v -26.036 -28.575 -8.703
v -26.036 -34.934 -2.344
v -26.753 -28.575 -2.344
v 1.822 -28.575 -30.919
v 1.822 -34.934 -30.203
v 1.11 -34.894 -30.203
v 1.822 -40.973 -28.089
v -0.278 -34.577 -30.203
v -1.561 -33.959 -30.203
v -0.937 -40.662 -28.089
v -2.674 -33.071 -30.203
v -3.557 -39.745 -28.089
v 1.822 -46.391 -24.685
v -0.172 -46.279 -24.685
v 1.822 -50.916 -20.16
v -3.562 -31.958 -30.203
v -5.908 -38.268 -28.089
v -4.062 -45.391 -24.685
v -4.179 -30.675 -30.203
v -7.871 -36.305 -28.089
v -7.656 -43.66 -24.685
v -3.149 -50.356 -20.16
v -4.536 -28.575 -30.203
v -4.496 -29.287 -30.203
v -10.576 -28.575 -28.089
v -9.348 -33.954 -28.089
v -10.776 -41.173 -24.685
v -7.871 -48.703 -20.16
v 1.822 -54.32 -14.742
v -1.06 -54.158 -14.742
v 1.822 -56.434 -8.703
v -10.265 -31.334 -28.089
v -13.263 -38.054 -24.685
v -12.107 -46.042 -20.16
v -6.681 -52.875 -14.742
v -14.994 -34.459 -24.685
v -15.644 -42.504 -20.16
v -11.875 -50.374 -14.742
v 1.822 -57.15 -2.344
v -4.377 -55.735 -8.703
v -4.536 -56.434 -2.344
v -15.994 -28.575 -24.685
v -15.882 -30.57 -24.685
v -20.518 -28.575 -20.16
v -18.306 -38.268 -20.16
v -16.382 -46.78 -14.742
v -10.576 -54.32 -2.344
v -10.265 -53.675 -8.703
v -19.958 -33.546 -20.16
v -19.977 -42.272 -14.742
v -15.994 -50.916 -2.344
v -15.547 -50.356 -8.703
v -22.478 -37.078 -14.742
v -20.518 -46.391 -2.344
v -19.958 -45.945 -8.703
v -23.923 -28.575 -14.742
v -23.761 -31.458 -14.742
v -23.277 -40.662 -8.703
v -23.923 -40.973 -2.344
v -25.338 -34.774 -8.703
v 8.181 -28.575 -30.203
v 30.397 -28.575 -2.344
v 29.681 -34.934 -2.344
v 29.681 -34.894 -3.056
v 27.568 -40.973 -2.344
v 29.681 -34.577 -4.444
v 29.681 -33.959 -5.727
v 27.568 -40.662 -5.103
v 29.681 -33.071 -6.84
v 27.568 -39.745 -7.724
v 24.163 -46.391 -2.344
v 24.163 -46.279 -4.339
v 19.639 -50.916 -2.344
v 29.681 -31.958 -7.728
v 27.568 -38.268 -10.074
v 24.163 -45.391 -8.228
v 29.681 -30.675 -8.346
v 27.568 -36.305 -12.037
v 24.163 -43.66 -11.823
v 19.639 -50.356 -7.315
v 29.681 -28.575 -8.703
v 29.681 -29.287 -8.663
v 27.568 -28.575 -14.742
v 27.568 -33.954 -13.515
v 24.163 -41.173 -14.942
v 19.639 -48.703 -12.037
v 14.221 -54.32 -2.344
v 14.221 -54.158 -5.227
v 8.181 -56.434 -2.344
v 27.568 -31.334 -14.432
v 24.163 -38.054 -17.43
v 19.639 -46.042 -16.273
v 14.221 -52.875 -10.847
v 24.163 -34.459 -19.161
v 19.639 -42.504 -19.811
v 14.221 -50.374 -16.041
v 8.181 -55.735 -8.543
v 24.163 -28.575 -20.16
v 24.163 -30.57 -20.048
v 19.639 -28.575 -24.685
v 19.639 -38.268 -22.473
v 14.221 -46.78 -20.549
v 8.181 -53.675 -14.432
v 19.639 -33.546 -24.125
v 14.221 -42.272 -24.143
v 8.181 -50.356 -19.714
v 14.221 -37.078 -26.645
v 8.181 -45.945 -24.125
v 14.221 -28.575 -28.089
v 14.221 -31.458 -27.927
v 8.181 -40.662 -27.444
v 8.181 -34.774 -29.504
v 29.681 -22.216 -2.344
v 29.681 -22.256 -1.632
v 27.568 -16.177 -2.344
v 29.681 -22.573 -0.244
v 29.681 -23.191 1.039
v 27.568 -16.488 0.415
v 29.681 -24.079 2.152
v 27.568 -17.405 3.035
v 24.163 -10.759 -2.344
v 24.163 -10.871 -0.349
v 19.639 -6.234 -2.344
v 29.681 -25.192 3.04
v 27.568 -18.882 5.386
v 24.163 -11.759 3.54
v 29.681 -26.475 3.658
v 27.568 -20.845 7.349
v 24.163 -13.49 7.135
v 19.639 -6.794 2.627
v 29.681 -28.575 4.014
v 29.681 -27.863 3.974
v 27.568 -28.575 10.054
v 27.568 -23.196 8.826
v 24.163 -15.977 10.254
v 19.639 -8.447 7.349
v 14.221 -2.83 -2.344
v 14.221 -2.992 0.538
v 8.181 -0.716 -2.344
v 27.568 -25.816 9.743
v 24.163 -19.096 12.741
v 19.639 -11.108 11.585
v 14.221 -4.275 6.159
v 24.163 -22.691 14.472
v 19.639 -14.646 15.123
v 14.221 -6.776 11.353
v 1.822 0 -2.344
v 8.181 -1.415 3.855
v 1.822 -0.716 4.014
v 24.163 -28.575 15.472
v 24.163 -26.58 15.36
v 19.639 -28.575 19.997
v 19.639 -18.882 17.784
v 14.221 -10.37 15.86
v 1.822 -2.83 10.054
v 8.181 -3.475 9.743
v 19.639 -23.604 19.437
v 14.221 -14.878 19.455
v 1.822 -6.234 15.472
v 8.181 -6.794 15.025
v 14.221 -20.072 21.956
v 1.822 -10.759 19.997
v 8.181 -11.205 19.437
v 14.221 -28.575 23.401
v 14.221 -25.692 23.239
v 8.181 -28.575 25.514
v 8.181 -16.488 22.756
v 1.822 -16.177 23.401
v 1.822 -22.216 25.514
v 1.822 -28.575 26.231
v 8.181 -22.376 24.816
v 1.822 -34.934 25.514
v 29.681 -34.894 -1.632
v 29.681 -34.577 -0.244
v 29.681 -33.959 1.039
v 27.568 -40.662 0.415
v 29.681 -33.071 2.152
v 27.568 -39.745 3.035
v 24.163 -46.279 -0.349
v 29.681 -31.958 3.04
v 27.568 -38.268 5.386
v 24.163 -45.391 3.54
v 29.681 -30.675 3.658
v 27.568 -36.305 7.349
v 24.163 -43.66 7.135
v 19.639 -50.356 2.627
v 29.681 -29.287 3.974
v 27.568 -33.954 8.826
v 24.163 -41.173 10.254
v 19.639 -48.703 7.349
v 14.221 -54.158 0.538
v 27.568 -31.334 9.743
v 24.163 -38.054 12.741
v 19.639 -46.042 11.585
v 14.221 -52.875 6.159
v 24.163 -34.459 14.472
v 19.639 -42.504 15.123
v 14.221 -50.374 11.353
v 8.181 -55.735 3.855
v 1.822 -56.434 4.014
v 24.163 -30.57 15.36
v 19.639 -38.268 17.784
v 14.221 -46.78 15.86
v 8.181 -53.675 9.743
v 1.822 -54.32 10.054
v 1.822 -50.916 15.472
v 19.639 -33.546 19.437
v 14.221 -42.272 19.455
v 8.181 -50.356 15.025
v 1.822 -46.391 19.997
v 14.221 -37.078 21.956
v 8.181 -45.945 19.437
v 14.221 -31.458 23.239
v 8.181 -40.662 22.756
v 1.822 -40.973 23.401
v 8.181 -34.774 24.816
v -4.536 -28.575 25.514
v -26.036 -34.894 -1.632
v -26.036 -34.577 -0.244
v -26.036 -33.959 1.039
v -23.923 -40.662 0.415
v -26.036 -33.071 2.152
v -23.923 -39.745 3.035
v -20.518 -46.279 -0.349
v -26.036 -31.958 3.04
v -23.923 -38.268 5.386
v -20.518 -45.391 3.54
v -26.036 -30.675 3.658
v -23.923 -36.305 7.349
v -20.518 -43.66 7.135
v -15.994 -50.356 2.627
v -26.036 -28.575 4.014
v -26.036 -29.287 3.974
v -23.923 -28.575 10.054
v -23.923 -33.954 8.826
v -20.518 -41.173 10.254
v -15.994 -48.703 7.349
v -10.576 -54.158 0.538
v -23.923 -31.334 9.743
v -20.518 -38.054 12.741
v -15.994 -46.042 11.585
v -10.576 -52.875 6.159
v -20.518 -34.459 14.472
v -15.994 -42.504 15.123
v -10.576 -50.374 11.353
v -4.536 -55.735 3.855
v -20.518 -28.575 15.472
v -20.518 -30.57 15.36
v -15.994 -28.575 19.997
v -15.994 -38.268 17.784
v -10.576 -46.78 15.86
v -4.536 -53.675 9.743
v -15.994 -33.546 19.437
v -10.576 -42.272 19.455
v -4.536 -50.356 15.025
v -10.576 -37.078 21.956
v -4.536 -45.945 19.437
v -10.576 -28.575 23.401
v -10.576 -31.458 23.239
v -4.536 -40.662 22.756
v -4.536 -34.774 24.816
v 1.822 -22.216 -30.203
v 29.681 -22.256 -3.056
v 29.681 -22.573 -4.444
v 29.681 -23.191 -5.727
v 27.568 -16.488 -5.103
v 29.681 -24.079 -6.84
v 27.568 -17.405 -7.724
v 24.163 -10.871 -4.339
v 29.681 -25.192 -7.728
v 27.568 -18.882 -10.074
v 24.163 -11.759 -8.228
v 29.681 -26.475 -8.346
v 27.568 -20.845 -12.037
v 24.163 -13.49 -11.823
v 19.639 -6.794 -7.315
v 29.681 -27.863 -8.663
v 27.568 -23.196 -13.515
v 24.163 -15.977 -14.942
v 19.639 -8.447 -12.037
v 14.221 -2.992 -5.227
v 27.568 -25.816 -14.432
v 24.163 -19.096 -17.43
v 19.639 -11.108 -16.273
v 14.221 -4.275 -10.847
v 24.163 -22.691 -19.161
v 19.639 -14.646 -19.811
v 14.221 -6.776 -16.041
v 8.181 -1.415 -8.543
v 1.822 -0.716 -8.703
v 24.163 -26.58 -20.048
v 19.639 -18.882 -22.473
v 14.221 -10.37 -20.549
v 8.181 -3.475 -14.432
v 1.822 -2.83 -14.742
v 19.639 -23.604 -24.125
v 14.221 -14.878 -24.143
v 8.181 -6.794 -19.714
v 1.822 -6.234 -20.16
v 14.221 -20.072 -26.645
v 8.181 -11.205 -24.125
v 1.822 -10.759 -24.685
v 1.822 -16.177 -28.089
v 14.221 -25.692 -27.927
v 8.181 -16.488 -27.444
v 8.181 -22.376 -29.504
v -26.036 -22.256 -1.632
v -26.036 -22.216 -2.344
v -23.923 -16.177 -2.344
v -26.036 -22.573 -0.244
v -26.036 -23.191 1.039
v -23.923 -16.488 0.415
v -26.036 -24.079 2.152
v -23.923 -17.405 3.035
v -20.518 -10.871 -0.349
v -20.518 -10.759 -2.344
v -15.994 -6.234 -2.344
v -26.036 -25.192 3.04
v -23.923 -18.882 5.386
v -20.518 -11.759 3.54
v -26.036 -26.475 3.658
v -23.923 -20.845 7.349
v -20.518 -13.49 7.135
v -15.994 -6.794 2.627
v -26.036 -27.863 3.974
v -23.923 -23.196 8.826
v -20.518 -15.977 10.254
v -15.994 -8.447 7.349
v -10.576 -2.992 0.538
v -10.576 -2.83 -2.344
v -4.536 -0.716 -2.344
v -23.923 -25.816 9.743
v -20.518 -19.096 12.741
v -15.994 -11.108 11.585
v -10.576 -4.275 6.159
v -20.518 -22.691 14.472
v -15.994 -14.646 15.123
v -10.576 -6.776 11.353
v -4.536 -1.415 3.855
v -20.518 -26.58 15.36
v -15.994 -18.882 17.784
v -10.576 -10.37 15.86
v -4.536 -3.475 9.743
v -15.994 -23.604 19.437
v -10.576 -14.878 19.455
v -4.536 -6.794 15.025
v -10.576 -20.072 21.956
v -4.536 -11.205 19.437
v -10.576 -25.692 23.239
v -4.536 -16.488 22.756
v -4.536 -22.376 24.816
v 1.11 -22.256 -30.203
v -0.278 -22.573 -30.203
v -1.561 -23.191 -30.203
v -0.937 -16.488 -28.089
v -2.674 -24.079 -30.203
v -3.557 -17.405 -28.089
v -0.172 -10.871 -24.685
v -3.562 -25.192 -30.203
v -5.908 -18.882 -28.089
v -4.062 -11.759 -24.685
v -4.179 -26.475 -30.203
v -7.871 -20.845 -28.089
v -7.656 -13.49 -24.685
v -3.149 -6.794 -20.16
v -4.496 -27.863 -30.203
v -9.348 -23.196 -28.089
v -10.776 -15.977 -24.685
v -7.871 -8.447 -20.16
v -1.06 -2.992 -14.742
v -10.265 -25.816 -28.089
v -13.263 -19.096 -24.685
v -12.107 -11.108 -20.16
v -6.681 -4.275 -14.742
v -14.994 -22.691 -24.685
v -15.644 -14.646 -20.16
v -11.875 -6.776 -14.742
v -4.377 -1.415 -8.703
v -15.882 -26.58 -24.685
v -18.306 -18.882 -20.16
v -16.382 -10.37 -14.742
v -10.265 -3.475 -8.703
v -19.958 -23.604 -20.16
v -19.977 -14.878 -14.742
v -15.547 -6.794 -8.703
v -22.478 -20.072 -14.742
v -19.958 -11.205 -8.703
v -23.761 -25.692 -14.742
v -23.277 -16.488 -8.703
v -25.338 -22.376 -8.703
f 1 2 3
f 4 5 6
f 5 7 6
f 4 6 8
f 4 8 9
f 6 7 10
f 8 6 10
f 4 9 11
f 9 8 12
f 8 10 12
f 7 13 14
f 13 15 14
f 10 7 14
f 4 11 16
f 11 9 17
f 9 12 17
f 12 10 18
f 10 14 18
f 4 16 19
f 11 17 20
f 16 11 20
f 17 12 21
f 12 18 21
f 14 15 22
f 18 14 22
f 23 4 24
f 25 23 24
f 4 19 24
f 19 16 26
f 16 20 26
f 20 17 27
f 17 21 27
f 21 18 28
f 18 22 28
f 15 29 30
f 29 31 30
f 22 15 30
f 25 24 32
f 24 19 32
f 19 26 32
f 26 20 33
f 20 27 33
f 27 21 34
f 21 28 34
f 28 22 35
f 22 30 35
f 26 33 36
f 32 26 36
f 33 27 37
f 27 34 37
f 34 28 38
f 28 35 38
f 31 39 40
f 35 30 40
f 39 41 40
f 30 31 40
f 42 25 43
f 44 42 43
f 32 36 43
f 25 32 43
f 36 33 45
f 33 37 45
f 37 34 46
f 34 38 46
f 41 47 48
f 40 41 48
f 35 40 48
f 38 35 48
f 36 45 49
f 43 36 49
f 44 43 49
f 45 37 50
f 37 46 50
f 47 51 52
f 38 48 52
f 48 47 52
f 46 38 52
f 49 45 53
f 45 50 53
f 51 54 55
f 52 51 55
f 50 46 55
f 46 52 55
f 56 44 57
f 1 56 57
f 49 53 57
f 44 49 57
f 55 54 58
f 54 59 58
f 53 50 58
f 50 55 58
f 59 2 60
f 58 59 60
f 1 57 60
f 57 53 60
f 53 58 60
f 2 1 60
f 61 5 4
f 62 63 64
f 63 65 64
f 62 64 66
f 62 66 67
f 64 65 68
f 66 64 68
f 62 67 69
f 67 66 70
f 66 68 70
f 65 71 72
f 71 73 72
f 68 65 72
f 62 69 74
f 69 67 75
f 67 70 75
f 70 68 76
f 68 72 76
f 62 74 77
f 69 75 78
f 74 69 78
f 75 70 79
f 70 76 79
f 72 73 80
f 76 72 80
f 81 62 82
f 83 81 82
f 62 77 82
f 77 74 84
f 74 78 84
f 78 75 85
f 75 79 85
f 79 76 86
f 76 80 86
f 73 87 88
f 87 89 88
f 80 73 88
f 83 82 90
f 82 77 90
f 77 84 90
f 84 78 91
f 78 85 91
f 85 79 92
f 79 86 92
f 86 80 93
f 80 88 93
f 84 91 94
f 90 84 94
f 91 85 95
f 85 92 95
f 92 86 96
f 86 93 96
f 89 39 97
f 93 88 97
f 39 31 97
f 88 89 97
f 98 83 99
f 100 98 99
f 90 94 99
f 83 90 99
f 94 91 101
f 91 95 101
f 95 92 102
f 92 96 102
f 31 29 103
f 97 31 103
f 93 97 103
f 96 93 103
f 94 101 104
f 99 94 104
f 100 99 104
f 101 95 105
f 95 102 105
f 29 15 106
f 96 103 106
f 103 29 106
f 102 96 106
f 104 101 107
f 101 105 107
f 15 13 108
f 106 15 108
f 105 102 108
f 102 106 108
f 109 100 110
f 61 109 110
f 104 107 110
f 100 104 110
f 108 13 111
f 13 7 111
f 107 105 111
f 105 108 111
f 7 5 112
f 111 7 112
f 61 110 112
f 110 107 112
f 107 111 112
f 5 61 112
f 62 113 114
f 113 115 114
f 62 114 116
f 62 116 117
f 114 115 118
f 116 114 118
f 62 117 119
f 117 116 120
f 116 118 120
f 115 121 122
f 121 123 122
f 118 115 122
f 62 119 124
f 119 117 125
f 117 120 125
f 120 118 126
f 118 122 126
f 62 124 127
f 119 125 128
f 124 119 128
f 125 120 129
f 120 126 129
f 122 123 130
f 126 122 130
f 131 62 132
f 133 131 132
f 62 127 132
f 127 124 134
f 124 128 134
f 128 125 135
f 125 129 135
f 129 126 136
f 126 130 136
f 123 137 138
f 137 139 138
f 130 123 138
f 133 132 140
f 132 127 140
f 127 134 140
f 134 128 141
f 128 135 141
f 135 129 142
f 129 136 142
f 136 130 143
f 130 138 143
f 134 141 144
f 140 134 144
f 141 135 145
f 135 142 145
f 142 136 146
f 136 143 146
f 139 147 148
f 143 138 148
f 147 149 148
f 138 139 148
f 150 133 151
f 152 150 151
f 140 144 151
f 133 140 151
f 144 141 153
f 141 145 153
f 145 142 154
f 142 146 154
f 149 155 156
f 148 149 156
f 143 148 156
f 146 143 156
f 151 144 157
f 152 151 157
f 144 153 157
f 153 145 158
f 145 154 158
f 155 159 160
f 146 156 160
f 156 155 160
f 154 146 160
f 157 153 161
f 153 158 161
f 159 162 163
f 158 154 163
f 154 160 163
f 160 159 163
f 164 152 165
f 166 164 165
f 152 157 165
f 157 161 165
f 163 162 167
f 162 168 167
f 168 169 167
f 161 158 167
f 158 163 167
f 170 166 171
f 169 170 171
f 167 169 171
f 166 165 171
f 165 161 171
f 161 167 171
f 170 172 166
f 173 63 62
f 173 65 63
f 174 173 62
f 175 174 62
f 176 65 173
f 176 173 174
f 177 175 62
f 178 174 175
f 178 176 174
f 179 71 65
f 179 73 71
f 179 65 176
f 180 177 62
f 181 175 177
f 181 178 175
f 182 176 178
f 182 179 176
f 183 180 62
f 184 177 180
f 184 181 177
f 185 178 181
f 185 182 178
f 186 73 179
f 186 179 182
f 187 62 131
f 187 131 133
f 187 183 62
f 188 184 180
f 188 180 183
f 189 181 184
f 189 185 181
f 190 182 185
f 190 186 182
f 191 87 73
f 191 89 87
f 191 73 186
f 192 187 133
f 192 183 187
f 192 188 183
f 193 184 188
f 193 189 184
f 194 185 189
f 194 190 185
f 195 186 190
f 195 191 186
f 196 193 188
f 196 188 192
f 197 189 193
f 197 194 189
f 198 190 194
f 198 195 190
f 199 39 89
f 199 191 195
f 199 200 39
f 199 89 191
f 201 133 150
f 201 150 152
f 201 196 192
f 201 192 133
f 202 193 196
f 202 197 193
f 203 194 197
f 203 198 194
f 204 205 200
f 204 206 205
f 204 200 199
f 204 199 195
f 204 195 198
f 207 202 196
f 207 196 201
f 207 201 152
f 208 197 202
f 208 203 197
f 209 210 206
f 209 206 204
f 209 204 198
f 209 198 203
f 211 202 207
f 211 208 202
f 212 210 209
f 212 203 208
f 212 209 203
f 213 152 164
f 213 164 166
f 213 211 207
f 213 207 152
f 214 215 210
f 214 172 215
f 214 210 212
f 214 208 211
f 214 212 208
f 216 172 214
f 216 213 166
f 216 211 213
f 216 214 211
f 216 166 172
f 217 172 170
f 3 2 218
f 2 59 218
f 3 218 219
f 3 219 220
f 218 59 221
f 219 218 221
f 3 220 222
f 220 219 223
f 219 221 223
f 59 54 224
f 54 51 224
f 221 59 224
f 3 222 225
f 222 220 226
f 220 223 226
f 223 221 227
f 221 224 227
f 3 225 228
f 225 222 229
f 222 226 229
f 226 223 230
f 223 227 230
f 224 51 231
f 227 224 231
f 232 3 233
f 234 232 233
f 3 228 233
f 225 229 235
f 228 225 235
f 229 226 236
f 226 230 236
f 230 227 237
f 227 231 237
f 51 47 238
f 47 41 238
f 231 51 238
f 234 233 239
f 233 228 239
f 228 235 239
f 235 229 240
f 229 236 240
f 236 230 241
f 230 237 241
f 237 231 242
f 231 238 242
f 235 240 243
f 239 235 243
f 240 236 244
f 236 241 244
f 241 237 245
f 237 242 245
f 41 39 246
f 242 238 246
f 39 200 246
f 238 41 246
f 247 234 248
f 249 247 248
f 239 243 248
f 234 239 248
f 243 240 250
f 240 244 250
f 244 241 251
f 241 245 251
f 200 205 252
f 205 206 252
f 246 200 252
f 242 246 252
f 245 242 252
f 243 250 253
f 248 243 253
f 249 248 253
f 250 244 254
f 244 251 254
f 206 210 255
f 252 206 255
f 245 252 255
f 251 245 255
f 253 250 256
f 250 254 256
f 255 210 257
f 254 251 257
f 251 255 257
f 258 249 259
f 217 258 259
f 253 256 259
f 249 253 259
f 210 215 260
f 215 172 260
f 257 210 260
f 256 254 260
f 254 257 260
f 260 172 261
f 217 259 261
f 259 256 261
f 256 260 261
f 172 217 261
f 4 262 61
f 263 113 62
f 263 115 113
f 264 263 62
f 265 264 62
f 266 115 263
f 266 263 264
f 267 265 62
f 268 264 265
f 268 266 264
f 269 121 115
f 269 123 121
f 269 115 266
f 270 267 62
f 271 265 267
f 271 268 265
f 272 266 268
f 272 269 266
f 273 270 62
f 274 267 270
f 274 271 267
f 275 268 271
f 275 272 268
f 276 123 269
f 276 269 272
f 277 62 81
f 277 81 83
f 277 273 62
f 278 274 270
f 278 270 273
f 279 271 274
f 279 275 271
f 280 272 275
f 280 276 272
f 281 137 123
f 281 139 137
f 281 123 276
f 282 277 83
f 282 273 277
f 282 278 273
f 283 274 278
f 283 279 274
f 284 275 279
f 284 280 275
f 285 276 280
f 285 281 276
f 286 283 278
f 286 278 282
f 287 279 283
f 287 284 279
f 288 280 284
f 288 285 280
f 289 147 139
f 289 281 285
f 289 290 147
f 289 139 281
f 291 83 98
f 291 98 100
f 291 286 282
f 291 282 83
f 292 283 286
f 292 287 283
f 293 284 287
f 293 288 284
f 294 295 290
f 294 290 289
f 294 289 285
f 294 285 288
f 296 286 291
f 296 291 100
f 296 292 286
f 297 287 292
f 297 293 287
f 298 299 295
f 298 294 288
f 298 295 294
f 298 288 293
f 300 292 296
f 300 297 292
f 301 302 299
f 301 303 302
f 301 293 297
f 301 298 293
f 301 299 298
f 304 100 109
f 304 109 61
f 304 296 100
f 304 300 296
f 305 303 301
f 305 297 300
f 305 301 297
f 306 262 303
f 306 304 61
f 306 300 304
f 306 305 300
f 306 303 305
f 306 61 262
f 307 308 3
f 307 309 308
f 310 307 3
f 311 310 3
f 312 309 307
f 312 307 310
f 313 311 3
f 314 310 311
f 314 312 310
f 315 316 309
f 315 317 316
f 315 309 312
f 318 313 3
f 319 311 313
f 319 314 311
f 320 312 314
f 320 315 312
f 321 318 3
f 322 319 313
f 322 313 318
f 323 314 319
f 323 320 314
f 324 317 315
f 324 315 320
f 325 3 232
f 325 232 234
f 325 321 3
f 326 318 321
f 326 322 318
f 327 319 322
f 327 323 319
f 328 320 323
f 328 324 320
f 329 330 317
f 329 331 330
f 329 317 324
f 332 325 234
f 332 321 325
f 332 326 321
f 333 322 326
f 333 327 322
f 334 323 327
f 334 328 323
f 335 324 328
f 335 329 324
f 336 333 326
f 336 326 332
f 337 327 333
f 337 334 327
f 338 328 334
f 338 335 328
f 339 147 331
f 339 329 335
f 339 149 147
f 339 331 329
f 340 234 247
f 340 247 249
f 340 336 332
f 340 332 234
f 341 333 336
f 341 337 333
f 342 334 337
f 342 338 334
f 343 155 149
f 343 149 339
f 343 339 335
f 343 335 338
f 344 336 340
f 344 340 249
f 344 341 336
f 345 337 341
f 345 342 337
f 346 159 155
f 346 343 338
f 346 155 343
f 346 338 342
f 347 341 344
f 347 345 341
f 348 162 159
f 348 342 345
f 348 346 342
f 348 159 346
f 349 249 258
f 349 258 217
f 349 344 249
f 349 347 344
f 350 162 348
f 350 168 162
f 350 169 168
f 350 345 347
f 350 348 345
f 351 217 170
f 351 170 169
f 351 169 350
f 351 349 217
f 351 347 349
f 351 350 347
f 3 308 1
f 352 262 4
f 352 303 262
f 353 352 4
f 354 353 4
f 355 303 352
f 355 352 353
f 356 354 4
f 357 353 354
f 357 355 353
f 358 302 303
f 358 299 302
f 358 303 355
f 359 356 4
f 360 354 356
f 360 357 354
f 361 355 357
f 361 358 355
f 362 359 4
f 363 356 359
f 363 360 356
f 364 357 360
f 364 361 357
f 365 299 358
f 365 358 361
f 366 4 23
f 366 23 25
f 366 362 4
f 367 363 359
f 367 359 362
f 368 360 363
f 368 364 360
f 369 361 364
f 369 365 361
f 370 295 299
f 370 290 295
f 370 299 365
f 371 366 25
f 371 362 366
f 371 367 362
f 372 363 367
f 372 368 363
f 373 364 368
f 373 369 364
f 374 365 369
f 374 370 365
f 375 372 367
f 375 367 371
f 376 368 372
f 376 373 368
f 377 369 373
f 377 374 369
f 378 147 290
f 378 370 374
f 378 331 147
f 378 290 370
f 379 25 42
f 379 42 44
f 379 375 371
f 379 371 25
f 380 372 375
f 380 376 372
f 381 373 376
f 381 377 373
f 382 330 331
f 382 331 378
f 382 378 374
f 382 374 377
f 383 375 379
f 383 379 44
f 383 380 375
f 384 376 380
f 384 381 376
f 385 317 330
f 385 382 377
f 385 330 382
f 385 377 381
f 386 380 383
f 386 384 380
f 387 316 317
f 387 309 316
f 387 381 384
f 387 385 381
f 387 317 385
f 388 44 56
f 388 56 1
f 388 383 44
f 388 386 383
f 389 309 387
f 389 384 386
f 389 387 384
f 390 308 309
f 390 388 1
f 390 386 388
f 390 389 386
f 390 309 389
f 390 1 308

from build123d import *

# Parameters (mm, degrees)
F1_W     = 57.15
F1_H     = 57.15
F2_DEPTH = 57.15
F3_R     = 28.57499


# Not quite as in the source:
# - a fillet or chamfer is up to 0.001 mm smaller than in the source, because OpenCascade refuses the exact size


with BuildPart() as f2:
    # F1 (on Front) → F2 (new body)
    with BuildSketch(Plane.XZ):
        with Locations((1.8223590608, -2.3441536301)):
            Rectangle(F1_W, F1_H)
    extrude(amount=F2_DEPTH)

    # F3 (radius 28.575 in the source; OpenCascade refuses exactly that, so slightly less here)
    f3_edges = [f2.edges().sort_by_distance(p)[0] for p in [
        (1.822359, -57.15, 26.230846),
        (-26.752641, -57.15, -2.344154),
        (1.822359, -57.15, -30.919154),
        (30.397359, -57.15, -2.344154),
        (1.822359, 0, 26.230846),
        (-26.752641, 0, -2.344154),
        (1.822359, 0, -30.919154),
        (30.397359, 0, -2.344154),
        (-26.752641, -28.575, -30.919154),
        (30.397359, -28.575, -30.919154),
        (30.397359, -28.575, 26.230846),
        (-26.752641, -28.575, 26.230846),
    ]]
    fillet(f3_edges, radius=F3_R)


solid = f2.part
